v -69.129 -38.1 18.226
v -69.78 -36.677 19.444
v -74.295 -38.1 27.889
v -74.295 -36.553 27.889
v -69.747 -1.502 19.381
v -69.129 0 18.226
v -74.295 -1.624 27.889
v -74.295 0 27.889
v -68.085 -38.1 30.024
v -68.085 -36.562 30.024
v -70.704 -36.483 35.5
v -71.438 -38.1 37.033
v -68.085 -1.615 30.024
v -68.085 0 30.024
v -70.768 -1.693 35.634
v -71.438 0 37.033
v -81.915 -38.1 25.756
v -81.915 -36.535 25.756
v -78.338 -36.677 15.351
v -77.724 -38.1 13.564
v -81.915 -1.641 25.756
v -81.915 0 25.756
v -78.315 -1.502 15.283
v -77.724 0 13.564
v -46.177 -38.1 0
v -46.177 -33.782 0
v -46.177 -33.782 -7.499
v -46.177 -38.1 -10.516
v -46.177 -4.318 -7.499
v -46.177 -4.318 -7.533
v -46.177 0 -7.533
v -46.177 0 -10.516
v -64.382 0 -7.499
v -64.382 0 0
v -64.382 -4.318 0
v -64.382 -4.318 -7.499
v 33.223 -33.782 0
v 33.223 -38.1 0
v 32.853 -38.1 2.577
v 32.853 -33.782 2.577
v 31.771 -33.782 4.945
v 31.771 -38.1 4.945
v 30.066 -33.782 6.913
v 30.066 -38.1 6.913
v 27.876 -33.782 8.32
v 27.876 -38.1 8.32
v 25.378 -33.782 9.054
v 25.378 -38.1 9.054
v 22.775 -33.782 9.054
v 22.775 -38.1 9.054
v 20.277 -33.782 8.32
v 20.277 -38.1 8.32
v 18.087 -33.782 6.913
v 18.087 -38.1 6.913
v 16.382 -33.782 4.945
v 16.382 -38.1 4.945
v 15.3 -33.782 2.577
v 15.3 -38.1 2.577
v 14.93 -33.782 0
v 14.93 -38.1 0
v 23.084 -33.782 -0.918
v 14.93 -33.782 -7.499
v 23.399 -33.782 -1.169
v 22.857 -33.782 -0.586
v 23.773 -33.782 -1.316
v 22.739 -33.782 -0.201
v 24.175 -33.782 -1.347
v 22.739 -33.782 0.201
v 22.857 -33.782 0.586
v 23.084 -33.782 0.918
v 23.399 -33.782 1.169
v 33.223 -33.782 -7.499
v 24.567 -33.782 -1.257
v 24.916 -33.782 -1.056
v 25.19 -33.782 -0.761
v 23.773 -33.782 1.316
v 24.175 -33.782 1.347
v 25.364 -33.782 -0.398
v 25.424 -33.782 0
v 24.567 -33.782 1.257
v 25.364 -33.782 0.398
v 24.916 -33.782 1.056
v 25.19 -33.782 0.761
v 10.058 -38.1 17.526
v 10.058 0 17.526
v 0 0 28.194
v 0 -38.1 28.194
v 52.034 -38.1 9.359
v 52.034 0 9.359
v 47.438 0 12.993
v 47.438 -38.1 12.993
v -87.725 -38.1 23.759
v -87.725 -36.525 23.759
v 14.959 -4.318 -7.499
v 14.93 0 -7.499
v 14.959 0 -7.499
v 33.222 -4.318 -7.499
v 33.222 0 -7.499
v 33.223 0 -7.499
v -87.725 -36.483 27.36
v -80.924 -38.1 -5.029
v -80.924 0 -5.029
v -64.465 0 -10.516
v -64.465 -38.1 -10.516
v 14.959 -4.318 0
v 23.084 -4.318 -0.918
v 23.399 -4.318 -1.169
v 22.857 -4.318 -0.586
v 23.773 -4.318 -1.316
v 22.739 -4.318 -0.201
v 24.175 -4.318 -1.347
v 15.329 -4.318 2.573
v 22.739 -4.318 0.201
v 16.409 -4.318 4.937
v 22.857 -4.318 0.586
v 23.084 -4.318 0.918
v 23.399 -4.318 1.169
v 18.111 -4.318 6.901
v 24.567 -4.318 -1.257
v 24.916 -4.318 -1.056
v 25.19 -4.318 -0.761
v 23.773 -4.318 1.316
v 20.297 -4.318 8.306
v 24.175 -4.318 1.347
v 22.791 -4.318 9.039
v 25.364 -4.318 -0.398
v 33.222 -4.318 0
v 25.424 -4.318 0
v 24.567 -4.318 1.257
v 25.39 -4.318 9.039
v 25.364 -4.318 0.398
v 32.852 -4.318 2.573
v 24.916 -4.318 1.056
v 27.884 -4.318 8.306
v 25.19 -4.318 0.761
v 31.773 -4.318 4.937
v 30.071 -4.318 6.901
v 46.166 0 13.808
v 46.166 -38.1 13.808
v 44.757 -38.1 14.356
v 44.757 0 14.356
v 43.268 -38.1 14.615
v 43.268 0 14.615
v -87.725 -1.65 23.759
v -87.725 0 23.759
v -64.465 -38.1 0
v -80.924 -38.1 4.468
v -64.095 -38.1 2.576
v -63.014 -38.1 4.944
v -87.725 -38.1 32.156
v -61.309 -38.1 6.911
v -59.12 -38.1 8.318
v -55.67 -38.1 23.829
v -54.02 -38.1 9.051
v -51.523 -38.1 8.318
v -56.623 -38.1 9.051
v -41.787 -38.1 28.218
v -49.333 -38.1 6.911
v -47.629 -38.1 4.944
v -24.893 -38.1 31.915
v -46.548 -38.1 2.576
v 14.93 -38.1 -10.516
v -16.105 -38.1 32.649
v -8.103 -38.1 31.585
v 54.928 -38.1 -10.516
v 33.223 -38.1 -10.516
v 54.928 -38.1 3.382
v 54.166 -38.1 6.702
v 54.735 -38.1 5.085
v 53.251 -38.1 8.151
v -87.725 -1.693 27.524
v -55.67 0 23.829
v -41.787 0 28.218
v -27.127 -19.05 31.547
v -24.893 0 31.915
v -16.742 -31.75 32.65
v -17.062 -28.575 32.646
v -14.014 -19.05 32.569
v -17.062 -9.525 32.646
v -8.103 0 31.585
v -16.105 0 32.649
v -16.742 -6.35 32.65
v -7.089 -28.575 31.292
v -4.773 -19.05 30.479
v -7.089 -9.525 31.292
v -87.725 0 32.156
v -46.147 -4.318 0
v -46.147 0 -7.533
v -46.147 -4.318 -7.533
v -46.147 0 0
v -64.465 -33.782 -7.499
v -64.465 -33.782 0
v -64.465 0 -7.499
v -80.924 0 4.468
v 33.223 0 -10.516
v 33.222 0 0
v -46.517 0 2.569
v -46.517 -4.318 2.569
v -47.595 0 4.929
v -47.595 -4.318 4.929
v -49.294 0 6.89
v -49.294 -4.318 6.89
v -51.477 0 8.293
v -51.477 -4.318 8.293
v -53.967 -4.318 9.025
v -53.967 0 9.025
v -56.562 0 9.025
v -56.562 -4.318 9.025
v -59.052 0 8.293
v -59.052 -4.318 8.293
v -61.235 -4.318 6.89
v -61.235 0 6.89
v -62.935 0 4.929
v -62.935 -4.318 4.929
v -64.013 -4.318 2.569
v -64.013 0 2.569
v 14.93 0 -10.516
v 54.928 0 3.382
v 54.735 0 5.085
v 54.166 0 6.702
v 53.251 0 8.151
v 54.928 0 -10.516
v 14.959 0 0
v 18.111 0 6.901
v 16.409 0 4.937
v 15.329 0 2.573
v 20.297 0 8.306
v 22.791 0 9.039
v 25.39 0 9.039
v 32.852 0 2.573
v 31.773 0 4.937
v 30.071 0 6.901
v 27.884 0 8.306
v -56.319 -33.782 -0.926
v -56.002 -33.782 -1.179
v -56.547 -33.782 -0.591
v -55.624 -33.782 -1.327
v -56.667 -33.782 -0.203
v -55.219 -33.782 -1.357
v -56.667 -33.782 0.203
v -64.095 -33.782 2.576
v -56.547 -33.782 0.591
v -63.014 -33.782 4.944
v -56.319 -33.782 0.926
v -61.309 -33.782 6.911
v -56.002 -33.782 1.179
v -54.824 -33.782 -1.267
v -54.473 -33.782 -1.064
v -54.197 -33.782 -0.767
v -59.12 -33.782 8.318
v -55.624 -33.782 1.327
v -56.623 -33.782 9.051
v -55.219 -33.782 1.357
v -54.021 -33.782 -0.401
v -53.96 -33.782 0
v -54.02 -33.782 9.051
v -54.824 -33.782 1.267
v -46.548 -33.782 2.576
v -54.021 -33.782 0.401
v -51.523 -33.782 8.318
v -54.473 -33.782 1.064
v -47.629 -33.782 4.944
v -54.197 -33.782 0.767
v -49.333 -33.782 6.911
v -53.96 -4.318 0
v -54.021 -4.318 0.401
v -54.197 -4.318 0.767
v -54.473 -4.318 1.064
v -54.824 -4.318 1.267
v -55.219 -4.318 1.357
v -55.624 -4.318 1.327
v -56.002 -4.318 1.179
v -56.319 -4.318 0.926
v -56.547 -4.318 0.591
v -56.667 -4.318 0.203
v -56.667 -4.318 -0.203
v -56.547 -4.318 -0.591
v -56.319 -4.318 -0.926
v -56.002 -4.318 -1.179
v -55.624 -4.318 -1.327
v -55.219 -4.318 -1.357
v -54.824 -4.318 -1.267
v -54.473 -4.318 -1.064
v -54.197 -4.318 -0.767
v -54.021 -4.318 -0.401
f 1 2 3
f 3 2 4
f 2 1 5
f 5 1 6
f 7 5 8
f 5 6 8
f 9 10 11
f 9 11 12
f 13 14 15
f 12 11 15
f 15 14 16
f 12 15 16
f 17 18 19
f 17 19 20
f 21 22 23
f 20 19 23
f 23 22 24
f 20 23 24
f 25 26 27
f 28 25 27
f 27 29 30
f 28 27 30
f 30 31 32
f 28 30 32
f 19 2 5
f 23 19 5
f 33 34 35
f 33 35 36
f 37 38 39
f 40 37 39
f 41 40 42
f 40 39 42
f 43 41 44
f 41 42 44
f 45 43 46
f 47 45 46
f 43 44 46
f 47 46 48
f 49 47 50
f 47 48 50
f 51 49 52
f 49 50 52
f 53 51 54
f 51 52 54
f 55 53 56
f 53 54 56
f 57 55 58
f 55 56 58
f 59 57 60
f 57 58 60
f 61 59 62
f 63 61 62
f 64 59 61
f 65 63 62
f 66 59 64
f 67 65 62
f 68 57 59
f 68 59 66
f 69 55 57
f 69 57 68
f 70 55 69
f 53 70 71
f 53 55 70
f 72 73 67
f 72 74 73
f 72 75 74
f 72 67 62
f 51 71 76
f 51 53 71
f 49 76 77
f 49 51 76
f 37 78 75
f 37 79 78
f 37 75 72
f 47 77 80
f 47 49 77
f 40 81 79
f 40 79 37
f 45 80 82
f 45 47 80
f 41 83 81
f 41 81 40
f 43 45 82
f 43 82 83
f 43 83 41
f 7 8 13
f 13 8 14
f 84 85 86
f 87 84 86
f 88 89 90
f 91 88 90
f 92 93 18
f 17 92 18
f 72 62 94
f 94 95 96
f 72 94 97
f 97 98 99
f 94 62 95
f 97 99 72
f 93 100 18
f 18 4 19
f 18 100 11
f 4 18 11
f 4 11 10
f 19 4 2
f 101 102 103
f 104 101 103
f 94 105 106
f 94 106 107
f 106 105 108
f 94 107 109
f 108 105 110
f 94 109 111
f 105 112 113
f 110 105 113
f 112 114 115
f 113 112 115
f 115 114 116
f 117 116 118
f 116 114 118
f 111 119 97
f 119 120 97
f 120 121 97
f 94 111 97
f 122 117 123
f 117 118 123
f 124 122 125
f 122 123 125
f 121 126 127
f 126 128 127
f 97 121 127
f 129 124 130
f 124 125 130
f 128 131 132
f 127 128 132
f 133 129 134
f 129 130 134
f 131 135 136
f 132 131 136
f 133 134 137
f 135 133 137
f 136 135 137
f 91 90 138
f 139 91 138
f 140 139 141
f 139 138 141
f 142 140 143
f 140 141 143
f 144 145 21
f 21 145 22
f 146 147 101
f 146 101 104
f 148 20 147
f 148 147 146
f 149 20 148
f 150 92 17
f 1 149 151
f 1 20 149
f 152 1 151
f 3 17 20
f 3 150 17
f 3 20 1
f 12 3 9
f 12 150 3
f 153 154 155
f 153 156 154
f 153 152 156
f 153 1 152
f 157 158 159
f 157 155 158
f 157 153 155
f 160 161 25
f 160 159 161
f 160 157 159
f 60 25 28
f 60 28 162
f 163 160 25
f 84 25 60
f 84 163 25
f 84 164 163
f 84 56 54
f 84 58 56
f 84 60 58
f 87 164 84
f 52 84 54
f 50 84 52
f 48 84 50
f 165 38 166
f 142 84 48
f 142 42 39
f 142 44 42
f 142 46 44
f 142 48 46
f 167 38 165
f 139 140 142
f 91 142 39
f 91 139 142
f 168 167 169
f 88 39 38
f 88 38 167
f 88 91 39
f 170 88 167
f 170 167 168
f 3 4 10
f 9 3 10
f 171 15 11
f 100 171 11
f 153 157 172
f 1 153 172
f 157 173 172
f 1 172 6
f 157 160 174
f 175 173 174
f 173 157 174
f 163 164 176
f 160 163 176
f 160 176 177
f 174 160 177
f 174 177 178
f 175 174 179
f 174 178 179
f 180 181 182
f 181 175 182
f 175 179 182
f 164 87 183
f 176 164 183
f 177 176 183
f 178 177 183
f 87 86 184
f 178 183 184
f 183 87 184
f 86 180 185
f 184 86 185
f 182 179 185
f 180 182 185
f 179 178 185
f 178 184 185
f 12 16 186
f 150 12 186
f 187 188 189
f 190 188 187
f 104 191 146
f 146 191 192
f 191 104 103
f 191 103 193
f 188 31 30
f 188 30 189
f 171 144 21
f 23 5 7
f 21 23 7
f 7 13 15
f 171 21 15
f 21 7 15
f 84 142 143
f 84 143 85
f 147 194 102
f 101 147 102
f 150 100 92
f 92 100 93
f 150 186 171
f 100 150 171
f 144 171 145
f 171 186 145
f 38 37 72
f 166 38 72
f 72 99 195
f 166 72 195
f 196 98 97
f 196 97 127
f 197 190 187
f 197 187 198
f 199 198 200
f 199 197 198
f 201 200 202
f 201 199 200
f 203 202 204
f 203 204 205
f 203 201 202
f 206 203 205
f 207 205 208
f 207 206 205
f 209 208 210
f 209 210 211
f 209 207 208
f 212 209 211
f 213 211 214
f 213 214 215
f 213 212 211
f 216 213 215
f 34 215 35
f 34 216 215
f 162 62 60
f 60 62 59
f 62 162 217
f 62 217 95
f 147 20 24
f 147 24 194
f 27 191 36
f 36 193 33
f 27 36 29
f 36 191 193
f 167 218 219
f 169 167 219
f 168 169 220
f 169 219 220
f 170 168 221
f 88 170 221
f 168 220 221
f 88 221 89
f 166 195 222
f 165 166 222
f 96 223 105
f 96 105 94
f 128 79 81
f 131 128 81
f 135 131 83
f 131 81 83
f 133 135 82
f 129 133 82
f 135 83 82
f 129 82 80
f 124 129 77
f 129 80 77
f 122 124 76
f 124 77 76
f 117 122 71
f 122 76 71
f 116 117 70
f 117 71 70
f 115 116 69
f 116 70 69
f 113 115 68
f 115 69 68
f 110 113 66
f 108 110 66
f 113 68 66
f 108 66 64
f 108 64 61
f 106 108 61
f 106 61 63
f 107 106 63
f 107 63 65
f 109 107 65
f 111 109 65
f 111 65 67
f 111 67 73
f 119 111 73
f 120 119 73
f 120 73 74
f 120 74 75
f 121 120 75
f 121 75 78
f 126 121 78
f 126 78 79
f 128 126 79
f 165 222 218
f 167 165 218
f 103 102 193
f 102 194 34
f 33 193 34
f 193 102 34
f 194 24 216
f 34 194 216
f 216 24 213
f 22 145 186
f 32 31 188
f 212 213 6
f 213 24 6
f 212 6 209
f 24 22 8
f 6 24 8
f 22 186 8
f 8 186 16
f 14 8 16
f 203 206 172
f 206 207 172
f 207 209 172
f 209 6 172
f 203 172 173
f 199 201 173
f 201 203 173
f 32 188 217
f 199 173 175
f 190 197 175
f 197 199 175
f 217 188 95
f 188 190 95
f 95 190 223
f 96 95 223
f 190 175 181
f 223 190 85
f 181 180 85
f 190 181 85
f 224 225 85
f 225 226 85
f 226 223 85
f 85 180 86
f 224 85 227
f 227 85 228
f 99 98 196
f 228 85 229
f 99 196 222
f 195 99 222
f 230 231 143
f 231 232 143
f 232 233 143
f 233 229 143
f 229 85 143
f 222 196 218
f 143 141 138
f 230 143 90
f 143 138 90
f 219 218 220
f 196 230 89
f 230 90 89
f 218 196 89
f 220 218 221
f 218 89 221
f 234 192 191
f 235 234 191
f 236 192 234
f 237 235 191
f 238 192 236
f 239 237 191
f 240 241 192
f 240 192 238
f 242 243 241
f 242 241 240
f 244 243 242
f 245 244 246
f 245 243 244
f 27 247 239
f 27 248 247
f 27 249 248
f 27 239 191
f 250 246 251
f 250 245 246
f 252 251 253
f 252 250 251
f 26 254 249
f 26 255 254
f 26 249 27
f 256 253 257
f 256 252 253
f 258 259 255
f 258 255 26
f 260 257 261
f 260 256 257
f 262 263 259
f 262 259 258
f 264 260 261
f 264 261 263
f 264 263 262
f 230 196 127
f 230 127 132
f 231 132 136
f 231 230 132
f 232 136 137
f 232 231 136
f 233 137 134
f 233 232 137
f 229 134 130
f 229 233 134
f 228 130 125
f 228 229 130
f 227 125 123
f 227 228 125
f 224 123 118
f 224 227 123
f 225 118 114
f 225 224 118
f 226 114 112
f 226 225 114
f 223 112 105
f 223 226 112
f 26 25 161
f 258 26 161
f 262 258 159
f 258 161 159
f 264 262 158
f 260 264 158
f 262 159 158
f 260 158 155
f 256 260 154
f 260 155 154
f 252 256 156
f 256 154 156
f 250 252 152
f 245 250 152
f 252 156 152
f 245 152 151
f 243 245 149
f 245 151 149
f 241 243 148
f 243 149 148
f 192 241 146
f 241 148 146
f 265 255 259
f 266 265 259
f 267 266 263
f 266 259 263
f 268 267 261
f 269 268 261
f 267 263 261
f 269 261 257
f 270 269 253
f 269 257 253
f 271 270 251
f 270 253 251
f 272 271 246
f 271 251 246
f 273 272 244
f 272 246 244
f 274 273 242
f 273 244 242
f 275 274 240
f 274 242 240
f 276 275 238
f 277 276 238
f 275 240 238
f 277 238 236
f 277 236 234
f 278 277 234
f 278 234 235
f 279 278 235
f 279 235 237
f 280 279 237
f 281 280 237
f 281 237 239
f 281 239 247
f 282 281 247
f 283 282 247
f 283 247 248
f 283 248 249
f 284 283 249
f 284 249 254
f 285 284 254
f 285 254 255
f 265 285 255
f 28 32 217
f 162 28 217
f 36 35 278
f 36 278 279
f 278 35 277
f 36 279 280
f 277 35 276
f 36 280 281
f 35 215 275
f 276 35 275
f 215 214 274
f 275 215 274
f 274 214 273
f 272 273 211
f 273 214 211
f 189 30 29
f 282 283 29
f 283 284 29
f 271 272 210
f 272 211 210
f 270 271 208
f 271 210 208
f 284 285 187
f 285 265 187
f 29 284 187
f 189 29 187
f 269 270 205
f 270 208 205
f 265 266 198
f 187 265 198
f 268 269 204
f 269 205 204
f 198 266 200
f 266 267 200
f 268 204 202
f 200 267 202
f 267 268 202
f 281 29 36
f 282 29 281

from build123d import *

# Parameters (mm, degrees)
F1_DEPTH  = 38.1
F3_DEPTH  = 25.4
F6_DEPTH  = 4.318
F8_DEPTH  = 4.318
F9_R      = 1.3609782851
F9_R_2    = 1.3503546706
F10_DEPTH = 61.214


# Not quite as in the source:
# - a feature names something its author has since deleted; it is built from what else it names


with BuildPart() as f1:
    # F0 (on Front) → F1 (new body)
    with BuildSketch(Plane.XZ):
        with BuildLine():
            Line((52.0340008008, 9.3591057662), (47.4384056476, 12.9927370075))
            ThreePointArc((47.4384056476, 12.9927370075), (45.4749605723, 14.1169814212), (43.2679541409, 14.615142718))
            Line((43.2679541409, 14.615142718), (10.0584002212, 17.5260007381))
            Line((10.0584002212, 17.5260007381), (0, 28.1940009445))
            add(Edge.make_bspline(
                [(0, 28.1940009445), (-9.1002955269, 33.2901659502), (-24.9064630473, 33.5549116559), (-55.7131559047, 24.6859865442), (-69.1292500573, 18.2258343206)],
                knots=[0, 0, 0, 0, 0.4163863711, 0.8919338321, 0.8919338321, 0.8919338321, 0.8919338321], degree=3))
            add(Edge.make_bspline(
                [(-69.1292500573, 18.2258343206), (-72.1780012369, 16.7577917973), (-75.0713687219, 15.2003305751), (-77.7240023017, 13.5635994375)],
                knots=[0.8919338321, 0.8919338321, 0.8919338321, 0.8919338321, 1, 1, 1, 1], degree=3))
            Line((-77.7240023017, 13.5635994375), (-80.9243991971, 4.4677392631))
            Line((-80.9243991971, 4.4677392631), (-80.9243991971, -5.0292001106))
            Line((-80.9243991971, -5.0292001106), (-64.465200973, -10.5156))
            Line((-64.465200973, -10.5156), (-64.465200973, -7.498764433))
            Line((-64.465200973, -7.498764433), (-64.465200973, 0))
            ThreePointArc((-64.465200973, 0), (-55.321200973, 9.144), (-46.177200973, 0))
            Line((-46.177200973, 0), (-46.177200973, -7.498764433))
            Line((-46.177200973, -7.498764433), (-46.177200973, -10.5156))
            Line((-46.177200973, -10.5156), (14.9299539626, -10.5156))
            Line((14.9299539626, -10.5156), (14.9299539626, -7.498764433))
            Line((14.9299539626, -7.498764433), (14.9299539626, 0))
            ThreePointArc((14.9299539626, 0), (24.076577276, 9.1466233134), (33.2232005894, 0))
            Line((33.2232005894, 0), (33.2232005894, -7.498764433))
            Line((33.2232005894, -7.498764433), (33.2232005894, -10.5156004429))
            Line((33.2232005894, -10.5156004429), (54.9278818071, -10.5156004429))
            Line((54.9278818071, -10.5156004429), (54.9278818071, 3.3817987423))
            ThreePointArc((54.9278818071, 3.3817987423), (54.1663592887, 6.7022936804), (52.0340008008, 9.3591057662))
        make_face()
        with BuildLine():
            add(Edge.make_bspline(
                [(-69.1292500573, 18.2258343206), (-72.1780012369, 16.7577917973), (-75.0713687219, 15.2003305751), (-77.7240023017, 13.5635994375)],
                knots=[0.8919338321, 0.8919338321, 0.8919338321, 0.8919338321, 1, 1, 1, 1], degree=3))
            Line((-69.1292500573, 18.2258343206), (-74.2949992421, 27.8891995555))
            Line((-74.2949992421, 27.8891995555), (-81.9149985909, 25.7555991411))
            Line((-81.9149985909, 25.7555991411), (-77.7240023017, 13.5635994375))
        make_face()
        with BuildLine():
            Line((14.9299539626, -7.498764433), (33.2232005894, -7.498764433))
            Line((33.2232005894, -7.498764433), (33.2232005894, 0))
            ThreePointArc((33.2232005894, 0), (24.076577276, 9.1466233134), (14.9299539626, 0))
            Line((14.9299539626, 0), (14.9299539626, -7.498764433))
        make_face()
        Polygon((-81.9149985909, 25.7555991411), (-74.2949992421, 27.8891995555), (-68.0850669491, 30.023861943), (-71.4375004172, 37.033200264), (-87.724568169, 32.1564003825), (-87.724568169, 23.7585613183), align=None)
        with BuildLine():
            Line((-64.465200973, -7.498764433), (-46.177200973, -7.498764433))
            Line((-46.177200973, -7.498764433), (-46.177200973, 0))
            ThreePointArc((-46.177200973, 0), (-55.321200973, 9.144), (-64.465200973, 0))
            Line((-64.465200973, 0), (-64.465200973, -7.498764433))
        make_face()
    extrude(amount=F1_DEPTH)

    # F2 (on face) → F3 (cut)
    with BuildSketch(Plane(origin=(-43.723380858, 0, -20.9120631104), x_dir=(0, 1, 0), z_dir=(0.9021271467, 0, 0.4314702901))):
        Polygon((-36.6774983704, 47.6490445435), (-1.5018450795, 47.5782938302), (-1.6934617888, 62.6805573702), (-36.4830493927, 62.532402575), align=None)
    extrude(amount=-F3_DEPTH, mode=Mode.SUBTRACT)

    # F5 (on face) → F6 (cut)
    with BuildSketch(Plane.XZ.offset(38.1)):
        with BuildLine():
            Line((-64.465200973, 0), (-64.465200973, -7.498764433))
            Line((-64.465200973, -7.498764433), (-46.177200973, -7.498764433))
            Line((-46.177200973, -7.498764433), (-46.177200973, 0))
            ThreePointArc((-46.177200973, 0), (-55.321200973, 9.144), (-64.465200973, 0))
        make_face()
        with BuildLine():
            Line((14.9299539626, 0), (14.9299539626, -7.498764433))
            Line((14.9299539626, -7.498764433), (33.2232005894, -7.498764433))
            Line((33.2232005894, -7.498764433), (33.2232005894, 0))
            ThreePointArc((33.2232005894, 0), (24.076577276, 9.1466233134), (14.9299539626, 0))
        make_face()
    extrude(amount=-F6_DEPTH, mode=Mode.SUBTRACT)

    # F7 (on face) → F8 (cut)
    with BuildSketch(Plane.XZ):
        with BuildLine():
            Line((14.9592272937, -8.4022274241), (33.2223922014, -8.4022274241))
            Line((33.2223922014, -8.4022274241), (33.2223922014, 0))
            ThreePointArc((33.2223922014, 0), (24.0908097476, 9.1315824538), (14.9592272937, 0))
            Line((14.9592272937, 0), (14.9592272937, -8.4022274241))
        make_face()
        with BuildLine():
            Line((-64.3822327256, -7.5330701657), (-46.1474433541, -7.5330701657))
            Line((-46.1474433541, -7.5330701657), (-46.1474433541, 0))
            ThreePointArc((-46.1474433541, 0), (-55.2648380399, 9.1173946857), (-64.3822327256, 0))
            Line((-64.3822327256, 0), (-64.3822327256, -7.5330701657))
        make_face()
    extrude(amount=F8_DEPTH, mode=Mode.SUBTRACT)

    # F9 (on face) → F10 (cut)
    with BuildSketch(Plane.XZ.offset(33.782)):
        with Locations((-55.321200973, 0)):
            Circle(F9_R)
        with Locations((24.0739539626, 0)):
            Circle(F9_R_2)
    extrude(amount=-F10_DEPTH, mode=Mode.SUBTRACT)


solid = f1.part
